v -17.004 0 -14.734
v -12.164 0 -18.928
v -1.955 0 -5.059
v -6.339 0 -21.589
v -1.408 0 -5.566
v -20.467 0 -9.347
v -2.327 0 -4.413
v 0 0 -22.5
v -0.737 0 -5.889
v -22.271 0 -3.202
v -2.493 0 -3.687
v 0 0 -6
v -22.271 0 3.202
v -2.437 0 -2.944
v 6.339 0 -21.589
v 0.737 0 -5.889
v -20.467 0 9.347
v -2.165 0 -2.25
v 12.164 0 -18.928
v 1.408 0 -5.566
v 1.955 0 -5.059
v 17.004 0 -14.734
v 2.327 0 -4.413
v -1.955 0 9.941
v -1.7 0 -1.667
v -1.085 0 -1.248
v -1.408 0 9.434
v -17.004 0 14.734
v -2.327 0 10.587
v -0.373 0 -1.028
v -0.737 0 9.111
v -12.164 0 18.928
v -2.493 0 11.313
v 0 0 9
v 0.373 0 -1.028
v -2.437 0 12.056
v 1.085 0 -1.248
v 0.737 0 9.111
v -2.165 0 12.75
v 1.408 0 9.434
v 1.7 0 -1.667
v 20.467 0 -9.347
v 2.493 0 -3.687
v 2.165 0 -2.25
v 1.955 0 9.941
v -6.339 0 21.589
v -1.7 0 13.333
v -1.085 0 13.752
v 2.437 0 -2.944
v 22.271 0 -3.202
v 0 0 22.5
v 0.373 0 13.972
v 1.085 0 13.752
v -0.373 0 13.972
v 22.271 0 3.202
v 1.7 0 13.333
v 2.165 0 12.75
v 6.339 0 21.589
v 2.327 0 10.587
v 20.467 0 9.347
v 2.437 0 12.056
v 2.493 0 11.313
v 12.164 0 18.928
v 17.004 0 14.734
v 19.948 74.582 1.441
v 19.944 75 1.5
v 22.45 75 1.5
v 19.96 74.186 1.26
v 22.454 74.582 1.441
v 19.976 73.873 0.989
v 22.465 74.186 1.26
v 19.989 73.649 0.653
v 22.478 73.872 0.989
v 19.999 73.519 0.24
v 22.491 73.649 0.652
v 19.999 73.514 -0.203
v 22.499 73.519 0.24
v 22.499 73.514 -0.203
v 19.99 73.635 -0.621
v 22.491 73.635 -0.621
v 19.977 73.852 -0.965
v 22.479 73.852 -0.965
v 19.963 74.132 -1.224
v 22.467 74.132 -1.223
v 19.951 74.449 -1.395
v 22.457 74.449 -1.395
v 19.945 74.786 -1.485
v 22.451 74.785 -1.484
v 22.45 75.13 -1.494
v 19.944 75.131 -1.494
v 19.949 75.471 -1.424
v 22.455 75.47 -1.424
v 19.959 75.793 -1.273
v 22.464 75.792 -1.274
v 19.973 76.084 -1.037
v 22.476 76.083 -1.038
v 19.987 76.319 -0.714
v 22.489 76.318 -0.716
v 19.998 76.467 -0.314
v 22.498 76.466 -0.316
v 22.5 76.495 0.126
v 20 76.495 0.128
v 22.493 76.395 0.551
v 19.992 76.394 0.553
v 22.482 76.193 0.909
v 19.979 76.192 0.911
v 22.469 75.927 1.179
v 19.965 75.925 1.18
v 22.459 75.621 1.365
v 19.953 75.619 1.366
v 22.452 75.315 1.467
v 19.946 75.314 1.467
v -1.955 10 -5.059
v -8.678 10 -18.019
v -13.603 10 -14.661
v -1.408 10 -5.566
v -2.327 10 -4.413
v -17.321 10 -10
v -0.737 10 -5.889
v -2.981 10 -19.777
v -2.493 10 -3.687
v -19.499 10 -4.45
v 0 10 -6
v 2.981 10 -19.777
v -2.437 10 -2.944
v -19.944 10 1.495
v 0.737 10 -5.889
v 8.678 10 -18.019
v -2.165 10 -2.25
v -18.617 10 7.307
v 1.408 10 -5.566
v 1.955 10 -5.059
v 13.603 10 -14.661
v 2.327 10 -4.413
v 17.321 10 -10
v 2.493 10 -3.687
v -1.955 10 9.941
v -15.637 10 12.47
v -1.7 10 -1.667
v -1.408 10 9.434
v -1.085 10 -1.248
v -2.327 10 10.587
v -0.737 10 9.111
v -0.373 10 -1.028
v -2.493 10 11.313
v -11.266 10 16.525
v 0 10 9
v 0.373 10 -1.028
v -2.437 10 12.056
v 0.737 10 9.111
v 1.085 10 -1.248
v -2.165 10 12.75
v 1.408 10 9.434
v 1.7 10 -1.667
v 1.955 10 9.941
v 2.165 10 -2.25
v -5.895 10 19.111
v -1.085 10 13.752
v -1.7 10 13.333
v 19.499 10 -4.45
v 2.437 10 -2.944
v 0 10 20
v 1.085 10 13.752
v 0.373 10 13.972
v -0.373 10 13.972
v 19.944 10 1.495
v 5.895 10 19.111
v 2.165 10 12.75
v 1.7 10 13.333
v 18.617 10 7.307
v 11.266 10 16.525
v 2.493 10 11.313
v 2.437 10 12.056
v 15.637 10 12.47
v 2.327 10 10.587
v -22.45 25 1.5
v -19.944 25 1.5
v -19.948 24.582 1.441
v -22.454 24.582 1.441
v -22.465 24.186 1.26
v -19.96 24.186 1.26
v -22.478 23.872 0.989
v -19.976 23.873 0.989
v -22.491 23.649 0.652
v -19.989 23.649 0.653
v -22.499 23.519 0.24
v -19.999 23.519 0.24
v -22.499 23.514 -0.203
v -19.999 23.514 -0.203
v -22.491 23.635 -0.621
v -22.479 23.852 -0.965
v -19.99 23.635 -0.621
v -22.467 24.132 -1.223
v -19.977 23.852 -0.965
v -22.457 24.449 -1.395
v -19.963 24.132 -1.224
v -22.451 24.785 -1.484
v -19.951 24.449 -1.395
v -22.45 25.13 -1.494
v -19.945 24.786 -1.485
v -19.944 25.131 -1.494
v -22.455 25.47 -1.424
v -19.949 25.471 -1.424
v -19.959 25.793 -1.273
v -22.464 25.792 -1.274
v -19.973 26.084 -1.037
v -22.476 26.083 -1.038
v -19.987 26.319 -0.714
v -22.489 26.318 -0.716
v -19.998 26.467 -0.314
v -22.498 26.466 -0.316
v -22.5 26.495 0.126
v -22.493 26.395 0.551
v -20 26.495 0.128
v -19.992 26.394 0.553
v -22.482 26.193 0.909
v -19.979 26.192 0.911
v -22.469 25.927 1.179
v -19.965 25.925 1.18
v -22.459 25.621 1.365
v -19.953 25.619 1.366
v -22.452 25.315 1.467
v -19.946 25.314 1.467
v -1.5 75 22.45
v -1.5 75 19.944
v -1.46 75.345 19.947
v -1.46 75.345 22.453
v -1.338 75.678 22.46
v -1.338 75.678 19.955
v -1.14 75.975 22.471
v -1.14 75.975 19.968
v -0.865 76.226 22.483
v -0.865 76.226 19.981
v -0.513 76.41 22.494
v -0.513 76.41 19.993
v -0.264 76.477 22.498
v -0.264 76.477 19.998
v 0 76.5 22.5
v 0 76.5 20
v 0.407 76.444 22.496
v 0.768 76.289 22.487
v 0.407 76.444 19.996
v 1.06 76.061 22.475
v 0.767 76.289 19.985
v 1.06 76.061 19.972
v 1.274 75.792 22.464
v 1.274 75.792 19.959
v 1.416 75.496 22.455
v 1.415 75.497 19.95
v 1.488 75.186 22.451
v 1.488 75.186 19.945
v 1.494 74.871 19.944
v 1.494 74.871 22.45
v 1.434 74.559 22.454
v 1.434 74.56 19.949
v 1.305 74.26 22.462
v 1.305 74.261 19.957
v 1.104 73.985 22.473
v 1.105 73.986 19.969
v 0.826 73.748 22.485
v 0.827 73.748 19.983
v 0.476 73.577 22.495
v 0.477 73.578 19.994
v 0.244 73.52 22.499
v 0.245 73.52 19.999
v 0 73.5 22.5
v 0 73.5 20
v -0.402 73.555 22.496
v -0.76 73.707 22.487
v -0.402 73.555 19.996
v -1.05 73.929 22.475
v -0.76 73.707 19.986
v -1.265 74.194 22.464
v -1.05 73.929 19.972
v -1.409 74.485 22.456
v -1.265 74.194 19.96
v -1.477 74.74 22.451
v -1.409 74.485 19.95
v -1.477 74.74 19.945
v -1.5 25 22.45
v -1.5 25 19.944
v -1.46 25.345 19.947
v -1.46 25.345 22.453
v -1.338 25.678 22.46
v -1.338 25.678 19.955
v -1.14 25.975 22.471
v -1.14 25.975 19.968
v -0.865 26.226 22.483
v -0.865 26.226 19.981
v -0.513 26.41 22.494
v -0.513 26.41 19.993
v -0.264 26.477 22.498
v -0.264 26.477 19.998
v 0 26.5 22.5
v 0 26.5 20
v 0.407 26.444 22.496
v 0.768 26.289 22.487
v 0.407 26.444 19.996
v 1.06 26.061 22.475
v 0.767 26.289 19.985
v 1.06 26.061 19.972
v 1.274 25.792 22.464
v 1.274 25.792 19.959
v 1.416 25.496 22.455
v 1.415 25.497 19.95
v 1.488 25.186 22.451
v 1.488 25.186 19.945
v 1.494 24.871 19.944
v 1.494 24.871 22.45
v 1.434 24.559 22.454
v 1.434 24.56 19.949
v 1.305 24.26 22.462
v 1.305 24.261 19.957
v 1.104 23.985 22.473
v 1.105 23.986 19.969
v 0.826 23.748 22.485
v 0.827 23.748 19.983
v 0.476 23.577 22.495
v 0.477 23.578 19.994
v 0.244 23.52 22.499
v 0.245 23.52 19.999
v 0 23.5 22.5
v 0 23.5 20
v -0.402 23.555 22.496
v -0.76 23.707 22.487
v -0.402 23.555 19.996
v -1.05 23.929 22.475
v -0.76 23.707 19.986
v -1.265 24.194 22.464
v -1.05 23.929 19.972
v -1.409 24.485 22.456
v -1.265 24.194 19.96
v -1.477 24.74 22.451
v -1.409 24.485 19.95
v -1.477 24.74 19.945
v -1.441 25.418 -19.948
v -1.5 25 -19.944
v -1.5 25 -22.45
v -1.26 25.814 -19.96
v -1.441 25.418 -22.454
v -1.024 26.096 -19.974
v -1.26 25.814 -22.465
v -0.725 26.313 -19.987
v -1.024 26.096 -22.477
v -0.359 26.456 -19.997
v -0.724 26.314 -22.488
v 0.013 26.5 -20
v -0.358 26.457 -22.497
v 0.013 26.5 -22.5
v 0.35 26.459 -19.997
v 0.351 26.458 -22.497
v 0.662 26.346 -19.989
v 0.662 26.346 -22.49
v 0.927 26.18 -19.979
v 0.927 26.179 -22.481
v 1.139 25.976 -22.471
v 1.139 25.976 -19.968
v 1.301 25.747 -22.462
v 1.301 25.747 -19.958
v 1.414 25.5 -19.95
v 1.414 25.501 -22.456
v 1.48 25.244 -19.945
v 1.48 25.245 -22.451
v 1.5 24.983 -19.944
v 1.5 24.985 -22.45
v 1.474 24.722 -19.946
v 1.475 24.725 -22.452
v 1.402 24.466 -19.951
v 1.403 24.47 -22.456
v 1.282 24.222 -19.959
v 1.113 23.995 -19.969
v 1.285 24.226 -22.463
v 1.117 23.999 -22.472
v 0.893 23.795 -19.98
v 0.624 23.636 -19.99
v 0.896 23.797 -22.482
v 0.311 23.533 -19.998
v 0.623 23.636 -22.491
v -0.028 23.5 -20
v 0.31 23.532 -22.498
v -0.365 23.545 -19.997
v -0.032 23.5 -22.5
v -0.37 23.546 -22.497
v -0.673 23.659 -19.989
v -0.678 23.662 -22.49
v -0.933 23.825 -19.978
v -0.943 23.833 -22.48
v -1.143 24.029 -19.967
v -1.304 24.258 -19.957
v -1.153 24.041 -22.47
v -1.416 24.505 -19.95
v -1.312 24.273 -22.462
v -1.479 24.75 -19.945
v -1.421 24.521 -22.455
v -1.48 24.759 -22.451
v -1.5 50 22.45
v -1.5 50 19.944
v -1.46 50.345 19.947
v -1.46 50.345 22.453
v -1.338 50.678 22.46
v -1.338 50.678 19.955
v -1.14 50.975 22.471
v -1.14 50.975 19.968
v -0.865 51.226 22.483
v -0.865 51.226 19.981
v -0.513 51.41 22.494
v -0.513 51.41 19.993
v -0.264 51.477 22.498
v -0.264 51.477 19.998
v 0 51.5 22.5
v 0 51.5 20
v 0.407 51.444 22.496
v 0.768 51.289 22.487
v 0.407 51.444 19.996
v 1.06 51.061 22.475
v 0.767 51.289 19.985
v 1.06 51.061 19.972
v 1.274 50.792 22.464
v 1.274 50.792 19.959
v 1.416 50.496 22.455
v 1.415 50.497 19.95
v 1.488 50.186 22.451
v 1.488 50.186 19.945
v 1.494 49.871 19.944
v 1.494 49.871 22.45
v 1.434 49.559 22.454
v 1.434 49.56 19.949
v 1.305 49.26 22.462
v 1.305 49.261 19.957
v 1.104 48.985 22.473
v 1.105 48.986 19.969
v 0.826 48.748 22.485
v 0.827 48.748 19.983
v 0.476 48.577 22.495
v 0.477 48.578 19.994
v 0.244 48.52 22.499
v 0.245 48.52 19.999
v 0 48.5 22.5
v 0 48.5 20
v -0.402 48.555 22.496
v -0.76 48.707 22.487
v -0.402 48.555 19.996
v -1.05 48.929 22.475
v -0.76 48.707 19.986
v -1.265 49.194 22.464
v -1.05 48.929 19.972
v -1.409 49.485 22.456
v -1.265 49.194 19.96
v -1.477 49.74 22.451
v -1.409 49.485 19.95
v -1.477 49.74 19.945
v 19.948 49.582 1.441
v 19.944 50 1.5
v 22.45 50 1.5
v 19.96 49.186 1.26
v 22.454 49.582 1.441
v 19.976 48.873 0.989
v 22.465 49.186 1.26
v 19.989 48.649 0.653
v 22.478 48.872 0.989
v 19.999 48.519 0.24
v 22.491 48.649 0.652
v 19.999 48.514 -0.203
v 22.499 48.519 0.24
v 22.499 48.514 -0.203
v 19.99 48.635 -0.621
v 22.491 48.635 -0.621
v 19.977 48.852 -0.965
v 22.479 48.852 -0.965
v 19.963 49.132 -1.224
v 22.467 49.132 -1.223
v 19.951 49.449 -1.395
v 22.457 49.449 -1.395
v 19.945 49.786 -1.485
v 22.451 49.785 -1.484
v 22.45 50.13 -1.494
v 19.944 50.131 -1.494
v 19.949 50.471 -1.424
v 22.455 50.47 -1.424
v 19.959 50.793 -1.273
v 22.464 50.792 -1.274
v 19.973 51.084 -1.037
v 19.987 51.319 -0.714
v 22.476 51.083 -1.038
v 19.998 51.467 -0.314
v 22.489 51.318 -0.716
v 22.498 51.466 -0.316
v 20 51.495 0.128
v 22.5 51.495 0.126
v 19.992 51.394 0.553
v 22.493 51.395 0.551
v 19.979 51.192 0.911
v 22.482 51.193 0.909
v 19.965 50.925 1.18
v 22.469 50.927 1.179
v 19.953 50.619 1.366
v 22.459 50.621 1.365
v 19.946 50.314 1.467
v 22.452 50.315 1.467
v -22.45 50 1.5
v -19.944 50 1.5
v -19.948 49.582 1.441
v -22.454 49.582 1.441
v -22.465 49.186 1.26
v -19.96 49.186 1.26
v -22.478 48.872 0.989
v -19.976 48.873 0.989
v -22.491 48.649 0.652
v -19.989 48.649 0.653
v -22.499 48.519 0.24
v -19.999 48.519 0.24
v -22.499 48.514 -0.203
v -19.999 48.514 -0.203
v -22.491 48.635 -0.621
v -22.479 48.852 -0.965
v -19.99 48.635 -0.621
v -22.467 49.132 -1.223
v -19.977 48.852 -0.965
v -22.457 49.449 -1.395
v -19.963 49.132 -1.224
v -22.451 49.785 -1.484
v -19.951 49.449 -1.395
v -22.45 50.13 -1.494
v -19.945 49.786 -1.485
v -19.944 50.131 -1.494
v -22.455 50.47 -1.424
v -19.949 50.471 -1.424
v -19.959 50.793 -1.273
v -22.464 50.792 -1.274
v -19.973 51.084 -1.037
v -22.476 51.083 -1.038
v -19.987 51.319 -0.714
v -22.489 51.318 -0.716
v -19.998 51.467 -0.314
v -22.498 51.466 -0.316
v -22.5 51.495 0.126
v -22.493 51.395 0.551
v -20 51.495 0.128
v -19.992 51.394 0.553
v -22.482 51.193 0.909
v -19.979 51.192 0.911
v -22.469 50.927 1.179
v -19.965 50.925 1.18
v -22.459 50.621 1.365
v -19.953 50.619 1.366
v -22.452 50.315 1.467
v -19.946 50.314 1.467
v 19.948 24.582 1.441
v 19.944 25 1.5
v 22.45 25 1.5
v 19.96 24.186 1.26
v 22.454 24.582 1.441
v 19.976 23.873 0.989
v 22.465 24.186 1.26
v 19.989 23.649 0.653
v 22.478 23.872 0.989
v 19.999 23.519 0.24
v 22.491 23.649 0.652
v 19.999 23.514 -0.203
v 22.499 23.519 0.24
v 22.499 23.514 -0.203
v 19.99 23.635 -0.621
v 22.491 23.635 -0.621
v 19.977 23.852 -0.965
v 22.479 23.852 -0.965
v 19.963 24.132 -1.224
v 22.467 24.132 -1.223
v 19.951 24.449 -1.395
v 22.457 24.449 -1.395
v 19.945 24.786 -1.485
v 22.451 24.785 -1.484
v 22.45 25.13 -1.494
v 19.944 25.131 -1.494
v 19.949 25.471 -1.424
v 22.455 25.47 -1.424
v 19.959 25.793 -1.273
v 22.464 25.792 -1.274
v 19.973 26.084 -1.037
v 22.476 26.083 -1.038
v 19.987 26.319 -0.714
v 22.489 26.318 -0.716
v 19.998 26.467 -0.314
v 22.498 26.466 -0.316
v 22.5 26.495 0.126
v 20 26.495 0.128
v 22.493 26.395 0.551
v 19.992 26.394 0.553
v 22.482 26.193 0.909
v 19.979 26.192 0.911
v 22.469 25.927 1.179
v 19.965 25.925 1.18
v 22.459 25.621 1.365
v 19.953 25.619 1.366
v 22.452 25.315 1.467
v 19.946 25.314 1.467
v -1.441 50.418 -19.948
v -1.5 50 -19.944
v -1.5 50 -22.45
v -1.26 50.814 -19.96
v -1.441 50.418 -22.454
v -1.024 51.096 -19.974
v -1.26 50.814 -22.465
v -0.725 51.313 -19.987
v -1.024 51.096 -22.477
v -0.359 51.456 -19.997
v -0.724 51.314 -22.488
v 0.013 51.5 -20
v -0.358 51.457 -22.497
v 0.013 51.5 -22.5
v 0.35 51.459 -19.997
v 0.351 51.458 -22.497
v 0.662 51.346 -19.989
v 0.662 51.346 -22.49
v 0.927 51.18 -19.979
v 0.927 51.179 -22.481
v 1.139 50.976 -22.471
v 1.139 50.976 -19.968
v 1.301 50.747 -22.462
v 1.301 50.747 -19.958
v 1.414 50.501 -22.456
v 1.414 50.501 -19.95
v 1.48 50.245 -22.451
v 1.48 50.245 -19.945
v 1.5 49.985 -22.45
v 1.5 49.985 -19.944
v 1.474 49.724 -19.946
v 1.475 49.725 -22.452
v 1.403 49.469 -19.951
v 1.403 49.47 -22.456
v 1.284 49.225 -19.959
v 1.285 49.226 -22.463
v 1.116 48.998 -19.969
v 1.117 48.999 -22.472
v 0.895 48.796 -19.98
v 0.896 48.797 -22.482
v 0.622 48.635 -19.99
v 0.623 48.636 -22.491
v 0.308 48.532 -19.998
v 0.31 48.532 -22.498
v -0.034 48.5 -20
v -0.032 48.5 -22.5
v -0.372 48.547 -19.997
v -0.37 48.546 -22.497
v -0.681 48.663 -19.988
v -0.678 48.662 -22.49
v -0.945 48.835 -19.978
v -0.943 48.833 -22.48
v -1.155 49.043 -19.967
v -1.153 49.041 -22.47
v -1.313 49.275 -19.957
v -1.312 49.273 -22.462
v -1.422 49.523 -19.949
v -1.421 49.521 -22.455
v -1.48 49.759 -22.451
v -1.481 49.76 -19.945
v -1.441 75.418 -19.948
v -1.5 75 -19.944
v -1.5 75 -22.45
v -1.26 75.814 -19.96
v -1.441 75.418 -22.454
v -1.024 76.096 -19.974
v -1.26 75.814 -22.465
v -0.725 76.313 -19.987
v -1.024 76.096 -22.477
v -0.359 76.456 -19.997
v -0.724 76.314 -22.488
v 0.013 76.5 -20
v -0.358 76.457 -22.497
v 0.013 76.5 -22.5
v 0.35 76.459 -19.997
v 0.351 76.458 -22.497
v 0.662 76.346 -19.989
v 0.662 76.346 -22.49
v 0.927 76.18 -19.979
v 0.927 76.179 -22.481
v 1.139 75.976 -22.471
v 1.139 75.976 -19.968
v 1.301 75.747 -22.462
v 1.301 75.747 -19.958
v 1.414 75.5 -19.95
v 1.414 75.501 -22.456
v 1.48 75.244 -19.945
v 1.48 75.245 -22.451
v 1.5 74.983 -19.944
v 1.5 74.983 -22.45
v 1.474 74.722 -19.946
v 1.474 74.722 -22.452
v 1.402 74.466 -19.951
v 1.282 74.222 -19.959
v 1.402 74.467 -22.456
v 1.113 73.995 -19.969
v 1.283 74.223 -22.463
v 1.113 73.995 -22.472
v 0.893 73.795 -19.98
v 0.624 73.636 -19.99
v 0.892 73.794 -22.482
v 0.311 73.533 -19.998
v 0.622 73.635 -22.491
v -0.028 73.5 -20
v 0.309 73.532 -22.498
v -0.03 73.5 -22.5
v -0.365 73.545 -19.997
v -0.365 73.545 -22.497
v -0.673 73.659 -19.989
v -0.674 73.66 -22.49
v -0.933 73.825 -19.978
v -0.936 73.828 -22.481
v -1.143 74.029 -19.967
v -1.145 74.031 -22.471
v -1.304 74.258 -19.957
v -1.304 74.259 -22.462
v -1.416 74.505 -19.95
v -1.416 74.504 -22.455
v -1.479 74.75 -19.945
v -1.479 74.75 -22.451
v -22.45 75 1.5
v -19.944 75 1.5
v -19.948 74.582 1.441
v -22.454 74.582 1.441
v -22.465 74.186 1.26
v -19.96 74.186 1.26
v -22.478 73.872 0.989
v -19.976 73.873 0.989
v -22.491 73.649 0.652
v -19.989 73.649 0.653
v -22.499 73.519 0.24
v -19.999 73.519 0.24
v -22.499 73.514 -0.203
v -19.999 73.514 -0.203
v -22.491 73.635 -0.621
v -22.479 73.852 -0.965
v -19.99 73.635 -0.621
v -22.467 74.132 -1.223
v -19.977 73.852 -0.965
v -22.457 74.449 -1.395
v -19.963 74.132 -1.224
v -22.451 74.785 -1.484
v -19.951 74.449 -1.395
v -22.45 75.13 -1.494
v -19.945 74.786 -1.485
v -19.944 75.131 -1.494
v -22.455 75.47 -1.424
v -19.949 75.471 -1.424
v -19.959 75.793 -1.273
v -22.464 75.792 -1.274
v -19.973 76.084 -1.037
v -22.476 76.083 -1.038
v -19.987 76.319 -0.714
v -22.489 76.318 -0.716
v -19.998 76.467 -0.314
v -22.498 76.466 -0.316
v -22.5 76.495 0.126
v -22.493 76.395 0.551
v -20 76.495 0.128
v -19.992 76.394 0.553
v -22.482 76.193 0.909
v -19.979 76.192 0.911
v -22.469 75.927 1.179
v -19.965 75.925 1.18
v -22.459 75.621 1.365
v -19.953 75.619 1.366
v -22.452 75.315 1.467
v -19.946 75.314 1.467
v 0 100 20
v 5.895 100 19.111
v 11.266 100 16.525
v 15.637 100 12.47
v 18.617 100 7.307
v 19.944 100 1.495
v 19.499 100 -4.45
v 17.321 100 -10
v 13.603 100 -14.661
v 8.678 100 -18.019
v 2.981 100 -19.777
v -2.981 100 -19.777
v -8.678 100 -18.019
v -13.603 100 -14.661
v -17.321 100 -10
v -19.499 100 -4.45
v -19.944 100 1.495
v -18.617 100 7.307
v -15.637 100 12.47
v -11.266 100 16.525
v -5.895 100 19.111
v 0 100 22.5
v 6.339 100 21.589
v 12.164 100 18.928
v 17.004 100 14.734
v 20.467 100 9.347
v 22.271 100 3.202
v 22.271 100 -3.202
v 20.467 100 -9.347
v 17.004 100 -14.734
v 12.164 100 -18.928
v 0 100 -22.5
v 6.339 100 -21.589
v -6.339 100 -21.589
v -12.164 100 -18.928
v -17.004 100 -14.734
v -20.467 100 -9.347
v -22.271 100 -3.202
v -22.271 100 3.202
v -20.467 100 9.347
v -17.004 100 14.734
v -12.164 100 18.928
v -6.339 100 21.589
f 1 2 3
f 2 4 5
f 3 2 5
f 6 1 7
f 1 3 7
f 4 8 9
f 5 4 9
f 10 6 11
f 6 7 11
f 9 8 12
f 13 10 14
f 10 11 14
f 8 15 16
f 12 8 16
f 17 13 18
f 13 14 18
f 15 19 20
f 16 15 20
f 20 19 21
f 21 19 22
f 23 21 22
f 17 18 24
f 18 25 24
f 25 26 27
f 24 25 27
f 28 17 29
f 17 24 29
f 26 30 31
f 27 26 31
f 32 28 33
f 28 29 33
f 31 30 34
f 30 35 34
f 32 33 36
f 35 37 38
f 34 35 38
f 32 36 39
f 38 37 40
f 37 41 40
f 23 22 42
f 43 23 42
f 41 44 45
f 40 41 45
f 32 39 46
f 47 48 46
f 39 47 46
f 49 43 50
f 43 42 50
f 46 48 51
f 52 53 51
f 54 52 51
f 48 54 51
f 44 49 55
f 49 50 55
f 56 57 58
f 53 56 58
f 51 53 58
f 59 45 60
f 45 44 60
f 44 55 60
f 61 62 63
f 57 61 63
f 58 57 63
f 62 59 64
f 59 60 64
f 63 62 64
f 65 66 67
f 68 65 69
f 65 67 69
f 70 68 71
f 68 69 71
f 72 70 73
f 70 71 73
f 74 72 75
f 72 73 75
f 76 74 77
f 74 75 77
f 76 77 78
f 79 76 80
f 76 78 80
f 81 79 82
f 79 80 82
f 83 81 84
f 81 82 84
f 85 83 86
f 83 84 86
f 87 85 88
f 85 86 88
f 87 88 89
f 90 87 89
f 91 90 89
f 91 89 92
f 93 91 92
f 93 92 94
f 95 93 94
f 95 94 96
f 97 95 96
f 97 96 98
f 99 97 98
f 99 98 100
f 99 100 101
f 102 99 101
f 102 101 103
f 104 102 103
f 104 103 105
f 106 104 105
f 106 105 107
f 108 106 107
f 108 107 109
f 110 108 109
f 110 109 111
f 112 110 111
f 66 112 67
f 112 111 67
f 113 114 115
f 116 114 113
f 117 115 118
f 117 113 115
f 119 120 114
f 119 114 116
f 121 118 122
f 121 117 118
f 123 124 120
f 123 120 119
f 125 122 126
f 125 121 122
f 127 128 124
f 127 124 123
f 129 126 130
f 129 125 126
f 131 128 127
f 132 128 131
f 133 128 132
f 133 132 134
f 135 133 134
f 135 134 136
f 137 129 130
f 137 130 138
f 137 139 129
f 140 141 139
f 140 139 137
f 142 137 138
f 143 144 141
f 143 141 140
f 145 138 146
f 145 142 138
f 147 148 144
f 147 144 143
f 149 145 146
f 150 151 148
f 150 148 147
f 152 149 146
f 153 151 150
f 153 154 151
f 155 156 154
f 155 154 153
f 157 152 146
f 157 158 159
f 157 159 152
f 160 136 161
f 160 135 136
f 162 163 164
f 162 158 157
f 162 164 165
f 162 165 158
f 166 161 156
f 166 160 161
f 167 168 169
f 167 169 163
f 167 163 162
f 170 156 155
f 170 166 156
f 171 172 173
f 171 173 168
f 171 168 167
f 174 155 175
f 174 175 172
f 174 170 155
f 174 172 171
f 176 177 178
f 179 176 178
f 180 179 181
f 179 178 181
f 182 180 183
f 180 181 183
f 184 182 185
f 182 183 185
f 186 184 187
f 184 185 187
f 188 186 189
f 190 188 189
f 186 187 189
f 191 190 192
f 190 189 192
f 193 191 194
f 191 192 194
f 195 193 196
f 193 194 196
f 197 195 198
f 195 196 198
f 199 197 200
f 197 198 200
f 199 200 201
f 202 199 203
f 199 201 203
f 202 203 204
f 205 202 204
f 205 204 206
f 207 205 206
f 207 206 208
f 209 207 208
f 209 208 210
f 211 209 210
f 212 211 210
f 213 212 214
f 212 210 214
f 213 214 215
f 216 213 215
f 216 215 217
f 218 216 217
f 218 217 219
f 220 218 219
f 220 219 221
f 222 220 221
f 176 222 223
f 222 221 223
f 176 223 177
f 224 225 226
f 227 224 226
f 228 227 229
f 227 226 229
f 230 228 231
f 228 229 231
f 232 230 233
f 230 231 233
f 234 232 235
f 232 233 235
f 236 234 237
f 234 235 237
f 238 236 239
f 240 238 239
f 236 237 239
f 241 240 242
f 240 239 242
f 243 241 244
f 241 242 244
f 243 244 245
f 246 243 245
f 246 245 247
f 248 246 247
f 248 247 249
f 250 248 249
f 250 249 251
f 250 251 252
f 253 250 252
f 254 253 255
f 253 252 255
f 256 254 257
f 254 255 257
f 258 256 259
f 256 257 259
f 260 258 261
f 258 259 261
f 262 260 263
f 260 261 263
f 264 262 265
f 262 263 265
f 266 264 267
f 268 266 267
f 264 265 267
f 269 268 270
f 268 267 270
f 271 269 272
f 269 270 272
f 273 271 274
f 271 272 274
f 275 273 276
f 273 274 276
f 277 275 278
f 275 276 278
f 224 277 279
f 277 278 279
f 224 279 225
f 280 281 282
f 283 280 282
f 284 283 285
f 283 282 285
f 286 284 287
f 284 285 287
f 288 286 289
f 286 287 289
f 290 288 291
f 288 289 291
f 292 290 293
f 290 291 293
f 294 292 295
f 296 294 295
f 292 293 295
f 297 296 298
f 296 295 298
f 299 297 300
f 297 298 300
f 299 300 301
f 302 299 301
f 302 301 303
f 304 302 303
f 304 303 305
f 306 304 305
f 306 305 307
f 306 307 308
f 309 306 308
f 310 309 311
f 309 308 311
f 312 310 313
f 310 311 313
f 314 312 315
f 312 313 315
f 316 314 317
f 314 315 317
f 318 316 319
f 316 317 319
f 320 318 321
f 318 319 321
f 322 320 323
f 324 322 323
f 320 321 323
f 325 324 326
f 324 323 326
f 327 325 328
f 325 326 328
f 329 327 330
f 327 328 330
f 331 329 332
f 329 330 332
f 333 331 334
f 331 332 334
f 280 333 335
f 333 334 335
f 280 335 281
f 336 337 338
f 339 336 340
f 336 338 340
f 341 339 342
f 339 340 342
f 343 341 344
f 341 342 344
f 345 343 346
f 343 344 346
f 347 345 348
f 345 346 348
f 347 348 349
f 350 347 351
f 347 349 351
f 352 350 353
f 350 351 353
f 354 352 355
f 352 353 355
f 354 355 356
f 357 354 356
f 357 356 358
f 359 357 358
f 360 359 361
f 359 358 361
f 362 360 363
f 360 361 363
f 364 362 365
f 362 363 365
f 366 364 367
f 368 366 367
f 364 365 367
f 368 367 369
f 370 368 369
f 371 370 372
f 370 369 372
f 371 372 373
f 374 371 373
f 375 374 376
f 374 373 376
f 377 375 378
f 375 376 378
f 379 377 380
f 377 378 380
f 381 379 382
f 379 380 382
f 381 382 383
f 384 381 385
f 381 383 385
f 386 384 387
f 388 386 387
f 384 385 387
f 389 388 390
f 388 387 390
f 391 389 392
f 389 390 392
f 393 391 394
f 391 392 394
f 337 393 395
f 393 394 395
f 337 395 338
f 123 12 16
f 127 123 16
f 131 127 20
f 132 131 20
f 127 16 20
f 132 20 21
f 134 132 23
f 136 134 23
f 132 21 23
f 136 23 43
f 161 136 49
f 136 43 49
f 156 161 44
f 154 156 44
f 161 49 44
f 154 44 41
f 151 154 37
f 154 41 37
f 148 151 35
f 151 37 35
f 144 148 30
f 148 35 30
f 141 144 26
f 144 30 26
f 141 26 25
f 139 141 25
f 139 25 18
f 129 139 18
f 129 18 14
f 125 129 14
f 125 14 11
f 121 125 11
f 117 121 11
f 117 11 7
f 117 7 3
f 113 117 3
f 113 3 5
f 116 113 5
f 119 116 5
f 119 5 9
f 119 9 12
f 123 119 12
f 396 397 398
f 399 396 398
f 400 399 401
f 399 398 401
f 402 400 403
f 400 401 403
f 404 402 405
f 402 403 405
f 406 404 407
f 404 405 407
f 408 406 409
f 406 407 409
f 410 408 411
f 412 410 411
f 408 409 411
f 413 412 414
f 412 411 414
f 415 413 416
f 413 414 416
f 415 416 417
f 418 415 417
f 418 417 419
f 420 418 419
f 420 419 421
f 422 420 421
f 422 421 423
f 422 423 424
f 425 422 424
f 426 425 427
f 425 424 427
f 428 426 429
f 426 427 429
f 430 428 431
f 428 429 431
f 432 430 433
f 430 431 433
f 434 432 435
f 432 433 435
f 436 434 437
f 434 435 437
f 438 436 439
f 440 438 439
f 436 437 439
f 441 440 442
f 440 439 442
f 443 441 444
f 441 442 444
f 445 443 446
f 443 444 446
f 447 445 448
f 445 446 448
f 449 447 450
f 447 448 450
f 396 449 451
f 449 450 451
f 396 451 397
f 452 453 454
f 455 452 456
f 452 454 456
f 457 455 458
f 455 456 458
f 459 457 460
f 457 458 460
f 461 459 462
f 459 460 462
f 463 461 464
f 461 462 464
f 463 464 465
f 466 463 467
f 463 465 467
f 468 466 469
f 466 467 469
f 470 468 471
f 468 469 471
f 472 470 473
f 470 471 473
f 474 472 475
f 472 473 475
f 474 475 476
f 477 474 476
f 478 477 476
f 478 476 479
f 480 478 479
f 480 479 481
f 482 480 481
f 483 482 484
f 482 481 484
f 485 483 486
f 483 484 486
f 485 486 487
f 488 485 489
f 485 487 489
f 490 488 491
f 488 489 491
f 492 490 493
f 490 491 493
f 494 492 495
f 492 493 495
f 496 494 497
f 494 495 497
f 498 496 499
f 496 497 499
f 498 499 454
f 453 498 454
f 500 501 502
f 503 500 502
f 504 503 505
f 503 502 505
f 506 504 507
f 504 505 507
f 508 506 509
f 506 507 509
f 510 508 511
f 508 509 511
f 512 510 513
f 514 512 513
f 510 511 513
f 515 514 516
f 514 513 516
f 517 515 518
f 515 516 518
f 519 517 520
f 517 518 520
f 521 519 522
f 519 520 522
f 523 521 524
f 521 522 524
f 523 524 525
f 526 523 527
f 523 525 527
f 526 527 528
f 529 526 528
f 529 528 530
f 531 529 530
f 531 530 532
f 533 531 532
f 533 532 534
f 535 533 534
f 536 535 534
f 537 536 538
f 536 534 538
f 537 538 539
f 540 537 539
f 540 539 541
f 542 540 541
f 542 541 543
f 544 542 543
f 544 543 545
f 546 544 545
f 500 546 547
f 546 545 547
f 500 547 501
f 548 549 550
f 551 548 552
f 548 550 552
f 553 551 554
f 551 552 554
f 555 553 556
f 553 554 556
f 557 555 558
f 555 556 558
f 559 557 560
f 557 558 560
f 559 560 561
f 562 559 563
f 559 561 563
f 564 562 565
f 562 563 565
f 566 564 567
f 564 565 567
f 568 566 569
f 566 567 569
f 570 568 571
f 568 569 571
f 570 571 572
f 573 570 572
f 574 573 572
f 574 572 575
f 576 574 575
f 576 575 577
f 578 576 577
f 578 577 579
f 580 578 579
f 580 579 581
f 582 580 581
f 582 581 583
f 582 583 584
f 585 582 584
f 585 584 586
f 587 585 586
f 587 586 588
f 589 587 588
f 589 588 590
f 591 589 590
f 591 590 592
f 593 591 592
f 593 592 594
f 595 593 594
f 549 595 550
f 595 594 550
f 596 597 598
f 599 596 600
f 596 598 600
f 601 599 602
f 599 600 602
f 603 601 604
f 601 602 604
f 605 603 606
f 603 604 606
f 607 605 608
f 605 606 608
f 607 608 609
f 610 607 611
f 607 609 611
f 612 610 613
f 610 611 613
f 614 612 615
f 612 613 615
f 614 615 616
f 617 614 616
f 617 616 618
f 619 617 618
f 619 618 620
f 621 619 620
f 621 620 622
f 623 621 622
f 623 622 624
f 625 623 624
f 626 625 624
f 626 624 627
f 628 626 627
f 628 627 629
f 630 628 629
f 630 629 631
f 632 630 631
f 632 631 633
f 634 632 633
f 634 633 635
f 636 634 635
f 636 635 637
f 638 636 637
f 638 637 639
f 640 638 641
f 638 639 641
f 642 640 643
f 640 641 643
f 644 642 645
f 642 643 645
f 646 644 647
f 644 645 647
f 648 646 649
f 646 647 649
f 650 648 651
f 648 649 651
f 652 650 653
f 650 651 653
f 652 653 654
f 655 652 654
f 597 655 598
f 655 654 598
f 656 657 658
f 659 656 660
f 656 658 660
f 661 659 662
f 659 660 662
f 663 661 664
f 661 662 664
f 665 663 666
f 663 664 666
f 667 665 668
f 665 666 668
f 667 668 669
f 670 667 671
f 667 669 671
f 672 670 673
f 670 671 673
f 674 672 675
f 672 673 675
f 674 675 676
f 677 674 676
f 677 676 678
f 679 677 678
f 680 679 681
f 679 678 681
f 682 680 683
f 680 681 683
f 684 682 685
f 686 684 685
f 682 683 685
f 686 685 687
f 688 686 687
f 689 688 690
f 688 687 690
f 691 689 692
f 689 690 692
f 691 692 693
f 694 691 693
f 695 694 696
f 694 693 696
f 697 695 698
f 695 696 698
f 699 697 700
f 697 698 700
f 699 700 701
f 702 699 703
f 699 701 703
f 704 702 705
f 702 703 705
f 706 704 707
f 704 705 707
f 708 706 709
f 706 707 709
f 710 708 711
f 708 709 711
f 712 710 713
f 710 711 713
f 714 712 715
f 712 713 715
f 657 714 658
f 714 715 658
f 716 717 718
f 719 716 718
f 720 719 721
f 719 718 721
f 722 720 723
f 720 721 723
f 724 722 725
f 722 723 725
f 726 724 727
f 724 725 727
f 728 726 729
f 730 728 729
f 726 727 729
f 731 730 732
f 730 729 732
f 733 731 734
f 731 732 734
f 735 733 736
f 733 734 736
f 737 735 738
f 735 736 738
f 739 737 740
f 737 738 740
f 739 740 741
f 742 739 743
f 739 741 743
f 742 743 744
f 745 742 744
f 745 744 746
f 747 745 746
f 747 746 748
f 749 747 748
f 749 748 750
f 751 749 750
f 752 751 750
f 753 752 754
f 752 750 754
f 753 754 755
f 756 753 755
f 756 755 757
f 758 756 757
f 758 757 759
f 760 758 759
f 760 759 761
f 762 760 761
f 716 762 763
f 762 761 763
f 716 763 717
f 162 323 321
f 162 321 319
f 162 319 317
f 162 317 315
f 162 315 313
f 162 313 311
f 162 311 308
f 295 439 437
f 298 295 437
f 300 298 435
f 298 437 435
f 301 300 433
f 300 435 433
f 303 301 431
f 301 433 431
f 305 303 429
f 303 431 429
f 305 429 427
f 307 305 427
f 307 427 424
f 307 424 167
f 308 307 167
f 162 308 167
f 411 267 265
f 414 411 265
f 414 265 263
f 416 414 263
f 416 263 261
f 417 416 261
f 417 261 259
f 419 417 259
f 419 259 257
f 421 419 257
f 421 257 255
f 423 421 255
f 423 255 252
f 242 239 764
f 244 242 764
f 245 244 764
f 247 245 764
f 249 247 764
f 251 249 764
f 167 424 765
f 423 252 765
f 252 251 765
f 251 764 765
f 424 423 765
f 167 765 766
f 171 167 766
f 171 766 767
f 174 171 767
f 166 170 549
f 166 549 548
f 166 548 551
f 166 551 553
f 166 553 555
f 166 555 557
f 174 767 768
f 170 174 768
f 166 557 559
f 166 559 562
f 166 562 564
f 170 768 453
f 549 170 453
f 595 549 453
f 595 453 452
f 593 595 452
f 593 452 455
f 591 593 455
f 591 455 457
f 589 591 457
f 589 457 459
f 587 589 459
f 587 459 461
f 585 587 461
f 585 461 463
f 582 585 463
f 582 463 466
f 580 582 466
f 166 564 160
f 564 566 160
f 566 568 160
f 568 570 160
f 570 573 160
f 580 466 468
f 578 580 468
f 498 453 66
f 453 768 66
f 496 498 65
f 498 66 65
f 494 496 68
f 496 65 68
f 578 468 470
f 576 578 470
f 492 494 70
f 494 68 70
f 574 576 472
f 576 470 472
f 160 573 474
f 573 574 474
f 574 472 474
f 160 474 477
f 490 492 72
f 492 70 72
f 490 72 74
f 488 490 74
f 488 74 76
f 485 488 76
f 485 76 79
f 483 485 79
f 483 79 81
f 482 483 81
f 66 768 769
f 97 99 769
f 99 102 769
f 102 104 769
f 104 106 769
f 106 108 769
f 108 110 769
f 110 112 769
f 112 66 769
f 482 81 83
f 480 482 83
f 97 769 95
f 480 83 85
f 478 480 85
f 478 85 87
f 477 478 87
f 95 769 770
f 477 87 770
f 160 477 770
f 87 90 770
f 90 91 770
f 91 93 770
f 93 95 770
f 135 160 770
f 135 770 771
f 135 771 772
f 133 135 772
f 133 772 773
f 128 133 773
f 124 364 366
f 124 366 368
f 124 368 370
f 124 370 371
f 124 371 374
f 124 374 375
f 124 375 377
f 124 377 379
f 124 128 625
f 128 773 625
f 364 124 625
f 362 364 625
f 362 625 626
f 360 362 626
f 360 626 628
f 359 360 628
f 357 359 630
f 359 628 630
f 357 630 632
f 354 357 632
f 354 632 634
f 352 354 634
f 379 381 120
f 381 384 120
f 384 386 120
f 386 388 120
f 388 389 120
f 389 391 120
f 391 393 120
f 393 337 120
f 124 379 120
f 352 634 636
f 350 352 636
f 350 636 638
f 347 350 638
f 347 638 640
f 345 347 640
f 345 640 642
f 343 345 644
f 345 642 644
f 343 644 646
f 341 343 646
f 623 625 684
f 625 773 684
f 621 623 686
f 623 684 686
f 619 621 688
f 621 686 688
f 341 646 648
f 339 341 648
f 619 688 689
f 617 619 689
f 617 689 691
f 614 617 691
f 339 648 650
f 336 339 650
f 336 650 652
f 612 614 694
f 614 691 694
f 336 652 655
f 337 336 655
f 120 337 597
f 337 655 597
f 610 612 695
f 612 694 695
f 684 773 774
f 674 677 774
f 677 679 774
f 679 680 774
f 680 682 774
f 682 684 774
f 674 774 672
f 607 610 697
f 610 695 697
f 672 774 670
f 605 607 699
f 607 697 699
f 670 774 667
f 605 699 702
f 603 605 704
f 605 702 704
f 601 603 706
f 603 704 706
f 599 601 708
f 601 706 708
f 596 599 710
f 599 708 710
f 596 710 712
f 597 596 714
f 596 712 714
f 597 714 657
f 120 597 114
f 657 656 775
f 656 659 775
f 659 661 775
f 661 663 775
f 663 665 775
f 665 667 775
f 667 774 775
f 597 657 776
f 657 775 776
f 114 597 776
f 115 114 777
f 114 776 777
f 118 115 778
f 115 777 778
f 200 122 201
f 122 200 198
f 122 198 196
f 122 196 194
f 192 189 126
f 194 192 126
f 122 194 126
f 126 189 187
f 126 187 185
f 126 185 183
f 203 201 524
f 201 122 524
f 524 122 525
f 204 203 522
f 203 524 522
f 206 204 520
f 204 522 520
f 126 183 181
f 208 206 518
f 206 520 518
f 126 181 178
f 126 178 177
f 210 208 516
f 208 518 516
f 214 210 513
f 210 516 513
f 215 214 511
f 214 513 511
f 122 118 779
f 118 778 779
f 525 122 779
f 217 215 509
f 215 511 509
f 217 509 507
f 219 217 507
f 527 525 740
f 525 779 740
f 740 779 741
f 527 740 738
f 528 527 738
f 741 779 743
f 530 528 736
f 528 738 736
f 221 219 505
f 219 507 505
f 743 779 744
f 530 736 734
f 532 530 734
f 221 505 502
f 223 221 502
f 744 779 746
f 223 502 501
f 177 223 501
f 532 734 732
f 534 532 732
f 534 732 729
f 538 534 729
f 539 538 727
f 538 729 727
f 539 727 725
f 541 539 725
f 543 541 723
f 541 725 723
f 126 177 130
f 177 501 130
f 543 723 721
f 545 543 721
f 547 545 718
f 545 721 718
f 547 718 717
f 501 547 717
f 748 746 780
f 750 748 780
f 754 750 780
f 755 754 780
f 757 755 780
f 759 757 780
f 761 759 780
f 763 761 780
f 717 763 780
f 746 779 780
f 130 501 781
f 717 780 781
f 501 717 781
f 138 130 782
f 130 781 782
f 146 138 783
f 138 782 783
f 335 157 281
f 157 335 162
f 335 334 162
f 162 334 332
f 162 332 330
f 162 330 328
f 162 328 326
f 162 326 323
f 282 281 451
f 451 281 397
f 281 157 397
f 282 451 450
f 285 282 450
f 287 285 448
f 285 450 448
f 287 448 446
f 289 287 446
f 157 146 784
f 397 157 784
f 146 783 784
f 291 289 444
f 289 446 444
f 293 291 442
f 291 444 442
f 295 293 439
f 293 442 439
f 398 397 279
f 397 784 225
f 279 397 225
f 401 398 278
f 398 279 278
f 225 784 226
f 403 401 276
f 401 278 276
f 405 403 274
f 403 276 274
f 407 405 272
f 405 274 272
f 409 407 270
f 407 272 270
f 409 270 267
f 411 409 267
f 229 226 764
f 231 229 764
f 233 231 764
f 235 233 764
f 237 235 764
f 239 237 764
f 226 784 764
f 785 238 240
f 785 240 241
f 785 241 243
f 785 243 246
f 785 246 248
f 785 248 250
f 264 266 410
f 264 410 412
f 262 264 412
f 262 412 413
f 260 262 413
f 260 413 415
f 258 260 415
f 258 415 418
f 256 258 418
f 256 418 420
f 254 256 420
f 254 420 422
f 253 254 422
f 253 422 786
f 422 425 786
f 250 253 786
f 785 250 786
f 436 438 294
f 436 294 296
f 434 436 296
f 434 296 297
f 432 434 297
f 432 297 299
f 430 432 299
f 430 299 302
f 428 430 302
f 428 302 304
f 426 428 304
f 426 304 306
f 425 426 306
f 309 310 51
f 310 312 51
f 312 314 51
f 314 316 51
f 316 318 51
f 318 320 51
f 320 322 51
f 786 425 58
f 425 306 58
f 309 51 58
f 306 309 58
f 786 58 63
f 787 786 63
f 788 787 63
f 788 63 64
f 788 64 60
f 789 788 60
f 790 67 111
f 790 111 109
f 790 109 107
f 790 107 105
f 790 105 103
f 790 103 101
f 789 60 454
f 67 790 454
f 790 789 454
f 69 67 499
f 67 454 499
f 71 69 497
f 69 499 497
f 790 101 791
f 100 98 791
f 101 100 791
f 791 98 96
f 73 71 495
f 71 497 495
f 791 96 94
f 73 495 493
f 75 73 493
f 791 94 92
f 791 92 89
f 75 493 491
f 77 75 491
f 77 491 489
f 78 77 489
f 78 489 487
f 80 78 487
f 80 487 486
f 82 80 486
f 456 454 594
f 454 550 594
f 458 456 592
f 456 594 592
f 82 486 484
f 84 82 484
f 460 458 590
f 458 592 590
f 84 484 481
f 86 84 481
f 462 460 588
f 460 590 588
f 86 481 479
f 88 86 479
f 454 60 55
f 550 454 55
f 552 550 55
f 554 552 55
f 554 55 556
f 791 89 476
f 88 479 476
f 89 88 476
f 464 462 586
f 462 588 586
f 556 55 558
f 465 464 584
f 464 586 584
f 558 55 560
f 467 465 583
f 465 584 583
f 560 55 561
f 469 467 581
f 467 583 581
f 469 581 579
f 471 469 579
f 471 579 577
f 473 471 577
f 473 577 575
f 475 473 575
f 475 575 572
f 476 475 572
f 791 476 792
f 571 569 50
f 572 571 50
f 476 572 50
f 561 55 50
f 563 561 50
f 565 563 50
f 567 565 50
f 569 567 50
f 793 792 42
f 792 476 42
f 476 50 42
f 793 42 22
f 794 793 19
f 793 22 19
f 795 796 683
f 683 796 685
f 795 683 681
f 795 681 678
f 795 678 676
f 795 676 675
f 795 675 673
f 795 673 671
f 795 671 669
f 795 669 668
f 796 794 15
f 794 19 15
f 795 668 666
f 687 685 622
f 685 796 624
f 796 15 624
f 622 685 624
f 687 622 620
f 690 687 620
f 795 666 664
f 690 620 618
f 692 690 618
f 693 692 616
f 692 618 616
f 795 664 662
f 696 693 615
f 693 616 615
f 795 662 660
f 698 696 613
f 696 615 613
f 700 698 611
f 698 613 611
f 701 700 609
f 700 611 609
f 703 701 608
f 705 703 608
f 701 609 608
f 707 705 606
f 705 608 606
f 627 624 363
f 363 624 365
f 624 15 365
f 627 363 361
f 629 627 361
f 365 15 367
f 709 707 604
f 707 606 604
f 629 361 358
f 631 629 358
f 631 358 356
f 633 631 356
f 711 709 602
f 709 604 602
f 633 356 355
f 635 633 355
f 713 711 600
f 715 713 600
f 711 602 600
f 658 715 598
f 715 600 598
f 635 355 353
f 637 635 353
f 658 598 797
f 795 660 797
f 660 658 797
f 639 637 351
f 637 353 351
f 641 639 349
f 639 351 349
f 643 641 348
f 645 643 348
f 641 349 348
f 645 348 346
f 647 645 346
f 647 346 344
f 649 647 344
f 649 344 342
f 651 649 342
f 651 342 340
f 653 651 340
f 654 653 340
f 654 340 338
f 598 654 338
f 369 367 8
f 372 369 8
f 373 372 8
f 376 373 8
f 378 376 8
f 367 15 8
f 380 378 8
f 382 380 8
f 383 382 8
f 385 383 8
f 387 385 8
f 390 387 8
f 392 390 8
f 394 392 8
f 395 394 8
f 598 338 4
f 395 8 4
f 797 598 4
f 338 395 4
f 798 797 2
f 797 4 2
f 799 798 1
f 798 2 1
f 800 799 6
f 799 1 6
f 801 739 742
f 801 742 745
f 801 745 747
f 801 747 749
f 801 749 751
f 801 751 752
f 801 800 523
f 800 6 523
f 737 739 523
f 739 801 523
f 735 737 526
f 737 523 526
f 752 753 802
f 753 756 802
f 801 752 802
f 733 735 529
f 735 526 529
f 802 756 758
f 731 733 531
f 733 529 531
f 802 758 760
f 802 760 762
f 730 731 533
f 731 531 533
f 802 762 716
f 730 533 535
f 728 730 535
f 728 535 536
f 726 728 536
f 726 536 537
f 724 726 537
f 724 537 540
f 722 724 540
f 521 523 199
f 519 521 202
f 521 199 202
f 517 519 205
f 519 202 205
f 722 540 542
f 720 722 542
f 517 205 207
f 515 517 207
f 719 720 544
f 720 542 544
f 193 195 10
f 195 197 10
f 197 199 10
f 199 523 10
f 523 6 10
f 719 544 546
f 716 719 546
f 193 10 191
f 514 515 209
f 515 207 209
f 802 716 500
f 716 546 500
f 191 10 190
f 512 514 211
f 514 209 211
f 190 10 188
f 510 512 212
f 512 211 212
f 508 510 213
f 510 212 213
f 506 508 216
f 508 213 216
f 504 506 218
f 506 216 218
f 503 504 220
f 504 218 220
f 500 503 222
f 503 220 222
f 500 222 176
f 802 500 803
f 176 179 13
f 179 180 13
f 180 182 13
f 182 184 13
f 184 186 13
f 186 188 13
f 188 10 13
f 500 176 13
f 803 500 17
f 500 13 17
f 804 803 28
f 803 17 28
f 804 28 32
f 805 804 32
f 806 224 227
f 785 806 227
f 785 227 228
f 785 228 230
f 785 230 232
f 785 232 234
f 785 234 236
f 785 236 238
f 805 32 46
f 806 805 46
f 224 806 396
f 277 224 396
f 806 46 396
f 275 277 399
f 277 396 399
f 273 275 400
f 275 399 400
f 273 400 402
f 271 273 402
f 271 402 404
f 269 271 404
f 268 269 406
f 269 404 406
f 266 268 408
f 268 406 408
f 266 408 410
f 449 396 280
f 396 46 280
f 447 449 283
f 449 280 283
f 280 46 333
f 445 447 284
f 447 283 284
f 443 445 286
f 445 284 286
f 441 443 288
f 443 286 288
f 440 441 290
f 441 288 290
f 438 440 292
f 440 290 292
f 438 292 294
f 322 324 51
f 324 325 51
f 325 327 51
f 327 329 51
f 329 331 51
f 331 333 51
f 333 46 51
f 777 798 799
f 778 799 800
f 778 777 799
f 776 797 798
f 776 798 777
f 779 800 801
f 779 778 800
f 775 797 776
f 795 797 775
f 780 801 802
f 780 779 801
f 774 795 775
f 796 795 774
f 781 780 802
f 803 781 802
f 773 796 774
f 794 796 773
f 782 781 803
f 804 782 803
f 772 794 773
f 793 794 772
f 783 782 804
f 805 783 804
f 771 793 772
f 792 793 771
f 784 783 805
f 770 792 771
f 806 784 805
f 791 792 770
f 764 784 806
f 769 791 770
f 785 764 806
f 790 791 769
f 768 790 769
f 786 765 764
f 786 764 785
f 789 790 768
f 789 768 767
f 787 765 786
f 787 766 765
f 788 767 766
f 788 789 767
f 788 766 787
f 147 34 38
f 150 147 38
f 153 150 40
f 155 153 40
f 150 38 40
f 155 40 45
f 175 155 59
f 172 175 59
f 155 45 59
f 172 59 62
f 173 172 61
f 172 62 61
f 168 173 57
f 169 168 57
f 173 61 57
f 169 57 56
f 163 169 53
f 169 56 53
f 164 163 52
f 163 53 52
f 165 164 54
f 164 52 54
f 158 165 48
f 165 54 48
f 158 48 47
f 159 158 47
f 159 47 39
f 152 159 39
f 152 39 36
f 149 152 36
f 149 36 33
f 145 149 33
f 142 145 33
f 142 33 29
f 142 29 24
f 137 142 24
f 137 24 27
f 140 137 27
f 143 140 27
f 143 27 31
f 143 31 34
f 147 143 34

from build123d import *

# Parameters (mm, degrees)
SKETCH1_R                             = 22.5
BOSS_EXTRUDE1_DEPTH                   = 100
TAP_DRILL_FOR_M6X1_0_TAP4_D           = 3
TAP_DRILL_FOR_M6X1_0_TAP5_D           = 3
TAP_DRILL_FOR_M6X1_0_TAP6_D           = 3
TAP_DRILL_FOR_M6X1_0_TAP6_ON_FACE_2_D = 3
TAP_DRILL_FOR_M6X1_0_TAP7_D           = 3
TAP_DRILL_FOR_M6X1_0_TAP7_ON_FACE_2_D = 3
SKETCH12_R                            = 20
CUT_EXTRUDE1_DEPTH                    = 90
SKETCH15_R                            = 2.5
CUT_EXTRUDE2_DEPTH                    = 90


with BuildPart() as part:
    # Sketch1 → Boss-Extrude1 (new body)
    with BuildSketch(Plane(origin=(0, 0, 0), x_dir=(1, 0, 0), z_dir=(0, 1, 0))):
        with Locations(Location((0, 0, 0), (0, 0, 270))):
            Circle(SKETCH1_R)
    extrude(amount=BOSS_EXTRUDE1_DEPTH)

    # Tap Drill for M6x1.0 Tap4 (through all)
    with Locations(Plane(origin=(0, 25, 22.5), x_dir=(1, 0, 0), z_dir=(0, 0, 1))):
        with Locations((0, 0)):
            Hole(TAP_DRILL_FOR_M6X1_0_TAP4_D / 2)

    # Tap Drill for M6x1.0 Tap5 (through all)
    with Locations(Plane(origin=(-22.5, 25, 0), x_dir=(0, 0, -1), z_dir=(-1, 0, 0))):
        with Locations((0, 0)):
            Hole(TAP_DRILL_FOR_M6X1_0_TAP5_D / 2)

    # Tap Drill for M6x1.0 Tap6 (through all)
    with Locations(Plane(origin=(-22.5, 50, 0), x_dir=(0, 0, -1), z_dir=(-1, 0, 0))):
        with Locations((0, 0)):
            Hole(TAP_DRILL_FOR_M6X1_0_TAP6_D / 2)

    # Tap Drill for M6x1.0 Tap6 on face 2 (through all)
    with Locations(Plane(origin=(0, 50, 22.5), x_dir=(1, 0, 0), z_dir=(0, 0, 1))):
        with Locations((0, 0)):
            Hole(TAP_DRILL_FOR_M6X1_0_TAP6_ON_FACE_2_D / 2)

    # Tap Drill for M6x1.0 Tap7 (through all)
    with Locations(Plane(origin=(0, 75, 22.5), x_dir=(1, 0, 0), z_dir=(0, 0, 1))):
        with Locations((0, 0)):
            Hole(TAP_DRILL_FOR_M6X1_0_TAP7_D / 2)

    # Tap Drill for M6x1.0 Tap7 on face 2 (through all)
    with Locations(Plane(origin=(-22.5, 75, 0), x_dir=(0, 0, -1), z_dir=(-1, 0, 0))):
        with Locations((0, 0)):
            Hole(TAP_DRILL_FOR_M6X1_0_TAP7_ON_FACE_2_D / 2)

    # Sketch12 → Cut-Extrude1 (cut)
    with BuildSketch(Plane(origin=(0, 100, 0), x_dir=(1, 0, 0), z_dir=(0, 1, 0))):
        with Locations(Location((0, 0, 0), (0, 0, 270))):
            Circle(SKETCH12_R)
    extrude(amount=-CUT_EXTRUDE1_DEPTH, mode=Mode.SUBTRACT)

    # Sketch15 → Cut-Extrude2 (cut)
    with BuildSketch(Plane.XZ):
        with Locations(Location((0, -3.5, 0), (0, 0, 270))):
            Circle(SKETCH15_R)
        with Locations(Location((0, 11.5, 0), (0, 0, 270))):
            Circle(SKETCH15_R)
    extrude(amount=-CUT_EXTRUDE2_DEPTH, mode=Mode.SUBTRACT)


solid = part.part
